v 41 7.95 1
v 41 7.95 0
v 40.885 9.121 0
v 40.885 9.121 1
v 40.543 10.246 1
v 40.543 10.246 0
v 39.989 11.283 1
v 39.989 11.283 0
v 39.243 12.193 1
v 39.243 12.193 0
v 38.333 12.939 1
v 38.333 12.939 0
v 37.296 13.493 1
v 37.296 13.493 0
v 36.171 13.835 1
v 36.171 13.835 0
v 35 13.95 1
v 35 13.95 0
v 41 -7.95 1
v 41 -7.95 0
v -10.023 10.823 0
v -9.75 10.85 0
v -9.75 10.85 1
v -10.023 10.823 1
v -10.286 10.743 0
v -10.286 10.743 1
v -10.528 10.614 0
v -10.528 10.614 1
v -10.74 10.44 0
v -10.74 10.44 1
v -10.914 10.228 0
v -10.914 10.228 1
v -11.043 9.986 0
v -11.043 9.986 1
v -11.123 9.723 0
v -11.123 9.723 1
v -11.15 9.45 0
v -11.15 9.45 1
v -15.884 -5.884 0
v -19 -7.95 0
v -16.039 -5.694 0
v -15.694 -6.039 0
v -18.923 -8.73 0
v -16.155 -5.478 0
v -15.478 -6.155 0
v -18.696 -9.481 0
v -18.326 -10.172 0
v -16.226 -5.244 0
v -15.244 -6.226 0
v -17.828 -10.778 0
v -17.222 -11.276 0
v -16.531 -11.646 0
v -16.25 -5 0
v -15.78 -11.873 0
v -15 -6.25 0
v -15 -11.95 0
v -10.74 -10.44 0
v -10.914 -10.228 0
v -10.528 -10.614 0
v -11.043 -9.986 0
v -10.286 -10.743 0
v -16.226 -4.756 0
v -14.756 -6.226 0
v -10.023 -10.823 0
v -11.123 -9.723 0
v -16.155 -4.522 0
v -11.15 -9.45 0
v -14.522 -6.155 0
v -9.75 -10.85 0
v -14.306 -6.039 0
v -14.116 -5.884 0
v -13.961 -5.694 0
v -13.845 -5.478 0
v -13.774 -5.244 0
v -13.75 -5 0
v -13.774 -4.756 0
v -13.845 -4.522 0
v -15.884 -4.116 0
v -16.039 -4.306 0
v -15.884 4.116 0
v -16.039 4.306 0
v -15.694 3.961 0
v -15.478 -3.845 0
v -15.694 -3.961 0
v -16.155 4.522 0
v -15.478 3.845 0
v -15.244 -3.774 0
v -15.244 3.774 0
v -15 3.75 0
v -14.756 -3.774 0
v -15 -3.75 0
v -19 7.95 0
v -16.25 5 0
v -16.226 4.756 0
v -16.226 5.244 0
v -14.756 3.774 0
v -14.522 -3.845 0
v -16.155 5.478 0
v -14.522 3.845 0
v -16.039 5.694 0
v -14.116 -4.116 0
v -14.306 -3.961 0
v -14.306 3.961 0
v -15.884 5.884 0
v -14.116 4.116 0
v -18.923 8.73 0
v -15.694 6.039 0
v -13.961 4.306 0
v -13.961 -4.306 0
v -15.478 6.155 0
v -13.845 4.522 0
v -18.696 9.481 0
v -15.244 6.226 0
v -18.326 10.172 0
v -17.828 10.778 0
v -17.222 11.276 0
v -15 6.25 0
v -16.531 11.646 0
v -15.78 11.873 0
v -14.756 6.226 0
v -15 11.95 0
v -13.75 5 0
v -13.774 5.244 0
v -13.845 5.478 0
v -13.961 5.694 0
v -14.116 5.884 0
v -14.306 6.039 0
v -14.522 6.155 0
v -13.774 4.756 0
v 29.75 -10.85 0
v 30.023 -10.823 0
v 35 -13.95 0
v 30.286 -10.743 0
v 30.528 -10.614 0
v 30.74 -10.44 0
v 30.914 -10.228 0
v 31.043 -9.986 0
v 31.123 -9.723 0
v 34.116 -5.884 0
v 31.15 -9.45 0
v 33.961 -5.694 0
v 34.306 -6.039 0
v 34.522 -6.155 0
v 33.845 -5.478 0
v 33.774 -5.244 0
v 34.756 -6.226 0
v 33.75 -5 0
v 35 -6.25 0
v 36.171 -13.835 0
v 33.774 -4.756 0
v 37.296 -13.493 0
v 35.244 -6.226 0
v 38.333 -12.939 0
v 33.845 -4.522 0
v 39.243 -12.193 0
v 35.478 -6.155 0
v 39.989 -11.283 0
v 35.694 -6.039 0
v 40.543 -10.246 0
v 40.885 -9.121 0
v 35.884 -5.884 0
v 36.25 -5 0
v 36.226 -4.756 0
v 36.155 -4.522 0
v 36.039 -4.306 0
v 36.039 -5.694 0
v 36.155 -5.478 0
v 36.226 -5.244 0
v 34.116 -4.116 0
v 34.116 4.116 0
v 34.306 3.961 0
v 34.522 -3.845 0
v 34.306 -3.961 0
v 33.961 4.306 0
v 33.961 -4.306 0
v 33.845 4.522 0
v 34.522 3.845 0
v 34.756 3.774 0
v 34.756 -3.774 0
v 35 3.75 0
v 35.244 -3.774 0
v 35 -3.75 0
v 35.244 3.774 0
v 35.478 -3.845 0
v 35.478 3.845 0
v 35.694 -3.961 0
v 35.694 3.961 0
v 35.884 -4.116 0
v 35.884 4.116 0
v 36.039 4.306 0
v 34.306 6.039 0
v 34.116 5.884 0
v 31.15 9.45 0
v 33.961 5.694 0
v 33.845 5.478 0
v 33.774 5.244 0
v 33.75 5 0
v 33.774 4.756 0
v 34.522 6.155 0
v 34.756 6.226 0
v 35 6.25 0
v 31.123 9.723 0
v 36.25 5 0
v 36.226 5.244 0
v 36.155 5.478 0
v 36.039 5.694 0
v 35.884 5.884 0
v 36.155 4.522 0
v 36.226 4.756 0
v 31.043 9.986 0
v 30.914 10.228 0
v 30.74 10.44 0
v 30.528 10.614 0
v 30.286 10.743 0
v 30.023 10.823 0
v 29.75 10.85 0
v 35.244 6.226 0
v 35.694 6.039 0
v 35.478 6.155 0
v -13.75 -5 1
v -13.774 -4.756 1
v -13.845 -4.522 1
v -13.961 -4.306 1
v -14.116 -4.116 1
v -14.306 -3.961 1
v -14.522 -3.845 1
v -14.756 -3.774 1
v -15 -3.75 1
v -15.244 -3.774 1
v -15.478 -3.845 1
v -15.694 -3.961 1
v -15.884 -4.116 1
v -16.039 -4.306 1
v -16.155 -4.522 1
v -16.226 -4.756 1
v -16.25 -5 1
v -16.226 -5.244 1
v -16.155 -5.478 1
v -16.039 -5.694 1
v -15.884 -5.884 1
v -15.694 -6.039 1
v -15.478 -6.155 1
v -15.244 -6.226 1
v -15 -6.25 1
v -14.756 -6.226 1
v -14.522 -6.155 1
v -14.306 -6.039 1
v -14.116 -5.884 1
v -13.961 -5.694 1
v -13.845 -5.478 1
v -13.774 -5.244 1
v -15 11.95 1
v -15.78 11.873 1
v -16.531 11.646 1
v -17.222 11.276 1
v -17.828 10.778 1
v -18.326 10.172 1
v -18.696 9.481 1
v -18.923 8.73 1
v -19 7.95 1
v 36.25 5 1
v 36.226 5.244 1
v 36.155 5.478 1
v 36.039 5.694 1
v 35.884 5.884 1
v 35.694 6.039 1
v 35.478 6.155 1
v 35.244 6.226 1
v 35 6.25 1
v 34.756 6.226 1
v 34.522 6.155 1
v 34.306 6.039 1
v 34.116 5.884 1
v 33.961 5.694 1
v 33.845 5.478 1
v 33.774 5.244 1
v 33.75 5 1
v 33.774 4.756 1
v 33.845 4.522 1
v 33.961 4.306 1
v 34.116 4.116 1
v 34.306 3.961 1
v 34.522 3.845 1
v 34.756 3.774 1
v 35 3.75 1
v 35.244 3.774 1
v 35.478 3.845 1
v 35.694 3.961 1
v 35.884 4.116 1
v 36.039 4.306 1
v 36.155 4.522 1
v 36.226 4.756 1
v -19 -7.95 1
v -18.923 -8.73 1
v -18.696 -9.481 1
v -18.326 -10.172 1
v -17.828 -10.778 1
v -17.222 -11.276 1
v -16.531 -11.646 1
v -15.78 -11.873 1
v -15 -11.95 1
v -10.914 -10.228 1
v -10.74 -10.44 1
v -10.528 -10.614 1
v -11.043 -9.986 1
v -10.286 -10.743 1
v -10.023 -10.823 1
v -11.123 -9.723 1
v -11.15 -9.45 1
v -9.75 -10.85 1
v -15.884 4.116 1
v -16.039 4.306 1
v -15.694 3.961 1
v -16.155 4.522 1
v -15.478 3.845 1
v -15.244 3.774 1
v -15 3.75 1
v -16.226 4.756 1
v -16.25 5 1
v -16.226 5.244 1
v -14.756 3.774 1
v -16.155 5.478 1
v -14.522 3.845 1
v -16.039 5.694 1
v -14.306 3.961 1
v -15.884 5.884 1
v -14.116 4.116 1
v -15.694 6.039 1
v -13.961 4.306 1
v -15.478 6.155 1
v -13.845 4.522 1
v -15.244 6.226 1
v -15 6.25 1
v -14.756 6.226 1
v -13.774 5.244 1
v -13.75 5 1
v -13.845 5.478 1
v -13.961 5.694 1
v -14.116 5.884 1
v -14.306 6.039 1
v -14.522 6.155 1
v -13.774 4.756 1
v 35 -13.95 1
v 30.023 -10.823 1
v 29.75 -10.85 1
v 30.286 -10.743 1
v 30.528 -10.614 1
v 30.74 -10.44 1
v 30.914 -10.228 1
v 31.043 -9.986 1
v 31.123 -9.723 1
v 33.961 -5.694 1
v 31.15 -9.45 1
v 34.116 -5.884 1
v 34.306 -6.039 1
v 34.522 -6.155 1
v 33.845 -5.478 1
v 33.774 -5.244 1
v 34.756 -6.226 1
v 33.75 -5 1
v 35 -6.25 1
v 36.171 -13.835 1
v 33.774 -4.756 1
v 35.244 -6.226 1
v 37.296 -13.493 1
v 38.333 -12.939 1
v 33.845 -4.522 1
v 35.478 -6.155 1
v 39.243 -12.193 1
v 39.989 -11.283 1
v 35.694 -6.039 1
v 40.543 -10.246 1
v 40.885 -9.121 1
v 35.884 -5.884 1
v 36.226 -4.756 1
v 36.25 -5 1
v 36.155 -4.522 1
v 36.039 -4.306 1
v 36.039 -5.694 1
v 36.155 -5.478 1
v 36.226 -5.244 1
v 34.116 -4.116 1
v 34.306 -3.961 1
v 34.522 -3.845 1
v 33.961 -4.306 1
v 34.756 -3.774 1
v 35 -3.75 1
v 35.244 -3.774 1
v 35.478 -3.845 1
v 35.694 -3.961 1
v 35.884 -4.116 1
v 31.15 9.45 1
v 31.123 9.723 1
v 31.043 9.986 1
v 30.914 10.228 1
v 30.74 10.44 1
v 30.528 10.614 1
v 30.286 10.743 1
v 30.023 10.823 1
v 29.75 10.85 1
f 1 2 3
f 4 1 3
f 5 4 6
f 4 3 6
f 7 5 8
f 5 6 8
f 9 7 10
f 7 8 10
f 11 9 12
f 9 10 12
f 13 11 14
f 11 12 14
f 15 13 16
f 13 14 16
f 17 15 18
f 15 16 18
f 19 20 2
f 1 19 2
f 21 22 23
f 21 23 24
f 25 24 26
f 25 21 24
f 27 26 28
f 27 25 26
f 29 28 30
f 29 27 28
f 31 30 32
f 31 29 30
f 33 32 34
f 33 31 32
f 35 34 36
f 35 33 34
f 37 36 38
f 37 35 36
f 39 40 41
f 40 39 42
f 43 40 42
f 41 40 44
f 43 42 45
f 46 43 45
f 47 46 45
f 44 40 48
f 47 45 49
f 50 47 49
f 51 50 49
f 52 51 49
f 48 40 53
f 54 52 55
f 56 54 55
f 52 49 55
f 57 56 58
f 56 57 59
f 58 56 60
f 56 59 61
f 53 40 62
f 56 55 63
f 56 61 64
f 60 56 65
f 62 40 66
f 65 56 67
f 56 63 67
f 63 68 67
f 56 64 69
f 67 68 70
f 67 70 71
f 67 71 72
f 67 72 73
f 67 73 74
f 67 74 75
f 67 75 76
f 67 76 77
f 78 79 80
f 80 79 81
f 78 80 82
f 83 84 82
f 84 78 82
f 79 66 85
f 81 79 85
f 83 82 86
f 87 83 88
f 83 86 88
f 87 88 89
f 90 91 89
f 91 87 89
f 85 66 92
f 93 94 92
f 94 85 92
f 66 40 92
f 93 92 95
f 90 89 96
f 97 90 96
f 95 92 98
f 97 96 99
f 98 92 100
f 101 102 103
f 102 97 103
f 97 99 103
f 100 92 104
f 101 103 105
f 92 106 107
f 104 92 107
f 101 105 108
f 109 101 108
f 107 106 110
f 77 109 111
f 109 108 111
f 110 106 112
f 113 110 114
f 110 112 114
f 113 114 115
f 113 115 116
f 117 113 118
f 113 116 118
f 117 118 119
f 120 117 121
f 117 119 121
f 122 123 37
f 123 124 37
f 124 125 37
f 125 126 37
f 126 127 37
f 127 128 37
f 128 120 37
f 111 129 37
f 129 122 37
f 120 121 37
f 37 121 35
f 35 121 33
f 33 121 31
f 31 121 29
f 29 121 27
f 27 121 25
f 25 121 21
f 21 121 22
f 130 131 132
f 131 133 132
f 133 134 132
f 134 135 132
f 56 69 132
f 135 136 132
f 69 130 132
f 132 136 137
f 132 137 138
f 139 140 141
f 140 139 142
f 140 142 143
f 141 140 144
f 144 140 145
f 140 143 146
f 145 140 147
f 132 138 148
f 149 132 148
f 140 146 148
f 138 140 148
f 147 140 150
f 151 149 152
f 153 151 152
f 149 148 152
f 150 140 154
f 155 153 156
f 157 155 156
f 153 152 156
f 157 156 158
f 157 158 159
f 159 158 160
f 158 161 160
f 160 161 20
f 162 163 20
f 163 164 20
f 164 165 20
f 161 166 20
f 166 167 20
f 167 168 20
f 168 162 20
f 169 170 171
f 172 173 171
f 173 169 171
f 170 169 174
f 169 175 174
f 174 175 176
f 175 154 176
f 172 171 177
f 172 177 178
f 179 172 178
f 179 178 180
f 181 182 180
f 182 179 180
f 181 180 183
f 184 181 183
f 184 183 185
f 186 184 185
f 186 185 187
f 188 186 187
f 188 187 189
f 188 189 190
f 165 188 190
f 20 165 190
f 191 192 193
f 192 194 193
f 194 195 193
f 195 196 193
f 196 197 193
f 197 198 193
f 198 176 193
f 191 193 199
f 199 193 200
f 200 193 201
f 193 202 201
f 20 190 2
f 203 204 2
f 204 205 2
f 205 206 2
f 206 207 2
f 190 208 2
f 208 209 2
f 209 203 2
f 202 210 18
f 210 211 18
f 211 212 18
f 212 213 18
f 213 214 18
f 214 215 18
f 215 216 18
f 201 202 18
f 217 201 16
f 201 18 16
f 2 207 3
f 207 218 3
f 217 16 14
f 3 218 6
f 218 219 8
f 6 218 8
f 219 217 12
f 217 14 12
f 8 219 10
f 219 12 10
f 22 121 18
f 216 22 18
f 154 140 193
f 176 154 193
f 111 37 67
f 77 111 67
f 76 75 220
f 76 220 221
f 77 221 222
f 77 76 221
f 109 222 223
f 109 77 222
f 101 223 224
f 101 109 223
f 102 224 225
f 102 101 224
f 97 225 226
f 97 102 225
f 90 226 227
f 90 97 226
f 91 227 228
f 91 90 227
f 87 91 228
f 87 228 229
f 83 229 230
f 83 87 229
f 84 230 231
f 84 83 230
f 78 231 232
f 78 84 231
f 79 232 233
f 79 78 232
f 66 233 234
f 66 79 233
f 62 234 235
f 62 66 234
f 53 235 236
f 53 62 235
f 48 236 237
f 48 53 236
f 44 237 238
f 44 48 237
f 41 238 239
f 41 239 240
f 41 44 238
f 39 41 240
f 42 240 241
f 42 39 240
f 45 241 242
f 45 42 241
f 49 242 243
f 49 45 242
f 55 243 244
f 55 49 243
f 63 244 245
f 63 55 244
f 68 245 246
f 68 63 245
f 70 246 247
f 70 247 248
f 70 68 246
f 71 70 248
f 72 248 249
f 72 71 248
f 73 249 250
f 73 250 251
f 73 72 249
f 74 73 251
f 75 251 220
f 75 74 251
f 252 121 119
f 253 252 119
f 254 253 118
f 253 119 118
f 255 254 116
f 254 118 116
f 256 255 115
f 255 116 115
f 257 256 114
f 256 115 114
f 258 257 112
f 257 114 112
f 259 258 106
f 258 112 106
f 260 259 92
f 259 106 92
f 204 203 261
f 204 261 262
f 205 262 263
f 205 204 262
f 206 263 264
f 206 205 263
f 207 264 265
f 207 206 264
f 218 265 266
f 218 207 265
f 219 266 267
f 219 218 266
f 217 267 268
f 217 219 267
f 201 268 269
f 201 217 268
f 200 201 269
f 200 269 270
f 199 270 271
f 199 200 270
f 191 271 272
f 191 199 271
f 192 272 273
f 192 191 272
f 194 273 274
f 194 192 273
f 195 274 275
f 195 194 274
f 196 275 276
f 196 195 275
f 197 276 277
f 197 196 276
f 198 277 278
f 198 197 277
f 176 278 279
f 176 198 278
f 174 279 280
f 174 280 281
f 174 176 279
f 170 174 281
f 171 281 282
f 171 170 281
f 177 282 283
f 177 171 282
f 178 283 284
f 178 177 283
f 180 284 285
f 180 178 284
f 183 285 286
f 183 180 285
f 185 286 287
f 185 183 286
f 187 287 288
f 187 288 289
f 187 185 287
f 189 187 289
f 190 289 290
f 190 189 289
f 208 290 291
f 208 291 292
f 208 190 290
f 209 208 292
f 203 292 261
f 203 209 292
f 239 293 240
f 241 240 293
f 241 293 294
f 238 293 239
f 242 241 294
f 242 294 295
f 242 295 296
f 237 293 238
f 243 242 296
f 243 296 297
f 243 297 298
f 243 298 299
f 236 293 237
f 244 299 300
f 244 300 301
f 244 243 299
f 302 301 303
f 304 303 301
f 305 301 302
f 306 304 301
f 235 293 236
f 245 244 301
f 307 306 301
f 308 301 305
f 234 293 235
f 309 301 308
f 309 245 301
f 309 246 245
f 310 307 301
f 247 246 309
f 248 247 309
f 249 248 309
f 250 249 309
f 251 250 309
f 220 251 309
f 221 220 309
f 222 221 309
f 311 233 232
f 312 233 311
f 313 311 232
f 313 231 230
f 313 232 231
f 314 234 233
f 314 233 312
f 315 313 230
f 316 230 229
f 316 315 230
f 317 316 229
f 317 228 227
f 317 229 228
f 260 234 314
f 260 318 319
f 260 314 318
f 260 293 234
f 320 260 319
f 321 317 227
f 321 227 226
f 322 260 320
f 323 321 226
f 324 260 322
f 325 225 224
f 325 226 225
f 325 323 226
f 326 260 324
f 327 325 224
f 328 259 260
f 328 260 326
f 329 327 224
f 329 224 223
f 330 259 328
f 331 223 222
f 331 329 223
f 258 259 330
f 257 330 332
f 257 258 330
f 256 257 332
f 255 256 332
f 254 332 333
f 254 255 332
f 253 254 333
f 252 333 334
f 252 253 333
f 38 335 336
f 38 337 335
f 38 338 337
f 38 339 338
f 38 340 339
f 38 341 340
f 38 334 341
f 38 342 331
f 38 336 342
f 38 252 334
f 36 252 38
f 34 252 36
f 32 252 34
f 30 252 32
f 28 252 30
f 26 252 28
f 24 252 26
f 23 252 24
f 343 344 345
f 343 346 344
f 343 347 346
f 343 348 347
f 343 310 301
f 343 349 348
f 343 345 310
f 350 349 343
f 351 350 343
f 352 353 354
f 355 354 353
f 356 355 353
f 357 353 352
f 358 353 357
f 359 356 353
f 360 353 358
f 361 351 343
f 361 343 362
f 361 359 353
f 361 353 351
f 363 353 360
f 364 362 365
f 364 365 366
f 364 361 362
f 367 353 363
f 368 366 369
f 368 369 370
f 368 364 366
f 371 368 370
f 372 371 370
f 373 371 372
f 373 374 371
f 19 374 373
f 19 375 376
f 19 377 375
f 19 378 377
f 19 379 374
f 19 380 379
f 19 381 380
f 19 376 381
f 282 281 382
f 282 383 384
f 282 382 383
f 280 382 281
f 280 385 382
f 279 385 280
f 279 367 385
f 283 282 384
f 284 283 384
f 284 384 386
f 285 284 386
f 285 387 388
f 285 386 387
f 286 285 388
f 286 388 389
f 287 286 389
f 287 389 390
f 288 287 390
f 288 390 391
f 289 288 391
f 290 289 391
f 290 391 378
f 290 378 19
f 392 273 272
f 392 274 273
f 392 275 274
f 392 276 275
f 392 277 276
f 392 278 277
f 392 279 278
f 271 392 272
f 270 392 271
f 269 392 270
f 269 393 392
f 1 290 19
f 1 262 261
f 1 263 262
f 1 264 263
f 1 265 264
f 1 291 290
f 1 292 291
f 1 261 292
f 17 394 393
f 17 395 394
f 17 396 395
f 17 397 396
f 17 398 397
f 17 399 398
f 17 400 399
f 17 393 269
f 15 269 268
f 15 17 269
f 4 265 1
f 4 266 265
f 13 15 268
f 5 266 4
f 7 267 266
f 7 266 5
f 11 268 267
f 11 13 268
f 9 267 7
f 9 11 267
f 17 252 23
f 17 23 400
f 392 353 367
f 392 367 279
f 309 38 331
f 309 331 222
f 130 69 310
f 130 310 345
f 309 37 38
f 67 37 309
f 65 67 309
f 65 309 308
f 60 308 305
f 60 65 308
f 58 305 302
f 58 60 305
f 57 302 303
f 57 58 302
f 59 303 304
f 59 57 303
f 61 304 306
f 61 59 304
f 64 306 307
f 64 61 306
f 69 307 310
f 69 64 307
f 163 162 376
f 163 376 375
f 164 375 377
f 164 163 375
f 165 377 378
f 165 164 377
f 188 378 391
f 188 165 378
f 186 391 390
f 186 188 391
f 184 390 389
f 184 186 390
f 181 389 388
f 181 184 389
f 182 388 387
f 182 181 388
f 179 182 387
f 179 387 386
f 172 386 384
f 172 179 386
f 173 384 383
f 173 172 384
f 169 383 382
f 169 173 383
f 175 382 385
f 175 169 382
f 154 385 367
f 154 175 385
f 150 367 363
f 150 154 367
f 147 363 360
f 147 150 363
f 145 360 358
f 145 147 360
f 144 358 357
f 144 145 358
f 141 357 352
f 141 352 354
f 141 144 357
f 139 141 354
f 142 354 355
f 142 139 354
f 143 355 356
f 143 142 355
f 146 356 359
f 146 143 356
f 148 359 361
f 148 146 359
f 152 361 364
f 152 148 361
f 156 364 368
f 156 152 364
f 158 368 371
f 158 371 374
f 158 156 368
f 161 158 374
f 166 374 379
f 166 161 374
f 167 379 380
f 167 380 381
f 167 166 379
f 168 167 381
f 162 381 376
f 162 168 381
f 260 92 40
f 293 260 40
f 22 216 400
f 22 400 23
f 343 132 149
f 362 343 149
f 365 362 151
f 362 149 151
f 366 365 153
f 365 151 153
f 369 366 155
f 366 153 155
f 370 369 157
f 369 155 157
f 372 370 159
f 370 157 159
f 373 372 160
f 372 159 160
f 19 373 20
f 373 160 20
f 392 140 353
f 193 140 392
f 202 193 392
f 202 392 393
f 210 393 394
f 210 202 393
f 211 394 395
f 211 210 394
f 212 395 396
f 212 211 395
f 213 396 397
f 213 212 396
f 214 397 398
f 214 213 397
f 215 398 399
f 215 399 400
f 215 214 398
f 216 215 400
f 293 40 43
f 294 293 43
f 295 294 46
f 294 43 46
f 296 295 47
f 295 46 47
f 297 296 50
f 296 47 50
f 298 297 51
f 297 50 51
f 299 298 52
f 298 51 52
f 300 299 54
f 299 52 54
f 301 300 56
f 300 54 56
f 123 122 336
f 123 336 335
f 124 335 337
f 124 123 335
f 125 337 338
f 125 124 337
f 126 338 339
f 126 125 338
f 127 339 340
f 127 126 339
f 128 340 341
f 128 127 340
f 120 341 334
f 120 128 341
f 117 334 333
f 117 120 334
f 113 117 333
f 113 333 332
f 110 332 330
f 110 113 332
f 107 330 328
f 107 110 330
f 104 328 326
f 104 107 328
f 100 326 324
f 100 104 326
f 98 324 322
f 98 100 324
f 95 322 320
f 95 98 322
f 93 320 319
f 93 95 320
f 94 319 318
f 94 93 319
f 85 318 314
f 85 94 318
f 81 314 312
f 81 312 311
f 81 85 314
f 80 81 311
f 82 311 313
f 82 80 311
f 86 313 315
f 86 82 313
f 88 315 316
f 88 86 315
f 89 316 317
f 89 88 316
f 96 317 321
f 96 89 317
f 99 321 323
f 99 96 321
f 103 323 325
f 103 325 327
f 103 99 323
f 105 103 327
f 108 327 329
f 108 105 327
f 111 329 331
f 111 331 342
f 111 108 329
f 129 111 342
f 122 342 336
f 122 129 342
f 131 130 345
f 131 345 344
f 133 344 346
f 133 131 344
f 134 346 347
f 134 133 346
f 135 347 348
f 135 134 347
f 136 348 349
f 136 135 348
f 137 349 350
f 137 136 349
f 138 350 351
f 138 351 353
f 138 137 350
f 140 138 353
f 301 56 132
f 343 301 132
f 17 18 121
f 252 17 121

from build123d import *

# Parameters (mm, degrees)
SKETCH_1_R      = 1.25
EXTRUDE_1_DEPTH = 1


with BuildPart() as part:
    # 草图1 → 凸台-拉伸1 (new body)
    with BuildSketch(Plane.XY):
        with BuildLine():
            Line((41, -7.95), (41, 7.95))
            ThreePointArc((41, 7.95), (39.242640687, 12.192640687), (35, 13.95))
            Line((35, 13.95), (-15, 11.95))
            ThreePointArc((-15, 11.95), (-17.828427125, 10.778427125), (-19, 7.95))
            Line((-19, 7.95), (-19, -7.95))
            ThreePointArc((-19, -7.95), (-17.828427125, -10.778427125), (-15, -11.95))
            Line((-15, -11.95), (35, -13.95))
            ThreePointArc((35, -13.95), (39.242640687, -12.192640687), (41, -7.95))
        make_face()
        with Locations((35, -5)):
            Circle(SKETCH_1_R, mode=Mode.SUBTRACT)
        with Locations((35, 5)):
            Circle(SKETCH_1_R, mode=Mode.SUBTRACT)
        with Locations((-15, -5)):
            Circle(SKETCH_1_R, mode=Mode.SUBTRACT)
        with Locations((-15, 5)):
            Circle(SKETCH_1_R, mode=Mode.SUBTRACT)
        with BuildLine():
            Line((29.75, 10.85), (-9.75, 10.85))
            ThreePointArc((-9.75, 10.85), (-10.739949494, 10.439949494), (-11.15, 9.45))
            Line((-11.15, 9.45), (-11.15, -9.45))
            ThreePointArc((-11.15, -9.45), (-10.739949494, -10.439949494), (-9.75, -10.85))
            Line((-9.75, -10.85), (29.75, -10.85))
            ThreePointArc((29.75, -10.85), (30.739949494, -10.439949494), (31.15, -9.45))
            Line((31.15, -9.45), (31.15, 9.45))
            ThreePointArc((31.15, 9.45), (30.739949494, 10.439949494), (29.75, 10.85))
        make_face(mode=Mode.SUBTRACT)
    extrude(amount=EXTRUDE_1_DEPTH)


solid = part.part
